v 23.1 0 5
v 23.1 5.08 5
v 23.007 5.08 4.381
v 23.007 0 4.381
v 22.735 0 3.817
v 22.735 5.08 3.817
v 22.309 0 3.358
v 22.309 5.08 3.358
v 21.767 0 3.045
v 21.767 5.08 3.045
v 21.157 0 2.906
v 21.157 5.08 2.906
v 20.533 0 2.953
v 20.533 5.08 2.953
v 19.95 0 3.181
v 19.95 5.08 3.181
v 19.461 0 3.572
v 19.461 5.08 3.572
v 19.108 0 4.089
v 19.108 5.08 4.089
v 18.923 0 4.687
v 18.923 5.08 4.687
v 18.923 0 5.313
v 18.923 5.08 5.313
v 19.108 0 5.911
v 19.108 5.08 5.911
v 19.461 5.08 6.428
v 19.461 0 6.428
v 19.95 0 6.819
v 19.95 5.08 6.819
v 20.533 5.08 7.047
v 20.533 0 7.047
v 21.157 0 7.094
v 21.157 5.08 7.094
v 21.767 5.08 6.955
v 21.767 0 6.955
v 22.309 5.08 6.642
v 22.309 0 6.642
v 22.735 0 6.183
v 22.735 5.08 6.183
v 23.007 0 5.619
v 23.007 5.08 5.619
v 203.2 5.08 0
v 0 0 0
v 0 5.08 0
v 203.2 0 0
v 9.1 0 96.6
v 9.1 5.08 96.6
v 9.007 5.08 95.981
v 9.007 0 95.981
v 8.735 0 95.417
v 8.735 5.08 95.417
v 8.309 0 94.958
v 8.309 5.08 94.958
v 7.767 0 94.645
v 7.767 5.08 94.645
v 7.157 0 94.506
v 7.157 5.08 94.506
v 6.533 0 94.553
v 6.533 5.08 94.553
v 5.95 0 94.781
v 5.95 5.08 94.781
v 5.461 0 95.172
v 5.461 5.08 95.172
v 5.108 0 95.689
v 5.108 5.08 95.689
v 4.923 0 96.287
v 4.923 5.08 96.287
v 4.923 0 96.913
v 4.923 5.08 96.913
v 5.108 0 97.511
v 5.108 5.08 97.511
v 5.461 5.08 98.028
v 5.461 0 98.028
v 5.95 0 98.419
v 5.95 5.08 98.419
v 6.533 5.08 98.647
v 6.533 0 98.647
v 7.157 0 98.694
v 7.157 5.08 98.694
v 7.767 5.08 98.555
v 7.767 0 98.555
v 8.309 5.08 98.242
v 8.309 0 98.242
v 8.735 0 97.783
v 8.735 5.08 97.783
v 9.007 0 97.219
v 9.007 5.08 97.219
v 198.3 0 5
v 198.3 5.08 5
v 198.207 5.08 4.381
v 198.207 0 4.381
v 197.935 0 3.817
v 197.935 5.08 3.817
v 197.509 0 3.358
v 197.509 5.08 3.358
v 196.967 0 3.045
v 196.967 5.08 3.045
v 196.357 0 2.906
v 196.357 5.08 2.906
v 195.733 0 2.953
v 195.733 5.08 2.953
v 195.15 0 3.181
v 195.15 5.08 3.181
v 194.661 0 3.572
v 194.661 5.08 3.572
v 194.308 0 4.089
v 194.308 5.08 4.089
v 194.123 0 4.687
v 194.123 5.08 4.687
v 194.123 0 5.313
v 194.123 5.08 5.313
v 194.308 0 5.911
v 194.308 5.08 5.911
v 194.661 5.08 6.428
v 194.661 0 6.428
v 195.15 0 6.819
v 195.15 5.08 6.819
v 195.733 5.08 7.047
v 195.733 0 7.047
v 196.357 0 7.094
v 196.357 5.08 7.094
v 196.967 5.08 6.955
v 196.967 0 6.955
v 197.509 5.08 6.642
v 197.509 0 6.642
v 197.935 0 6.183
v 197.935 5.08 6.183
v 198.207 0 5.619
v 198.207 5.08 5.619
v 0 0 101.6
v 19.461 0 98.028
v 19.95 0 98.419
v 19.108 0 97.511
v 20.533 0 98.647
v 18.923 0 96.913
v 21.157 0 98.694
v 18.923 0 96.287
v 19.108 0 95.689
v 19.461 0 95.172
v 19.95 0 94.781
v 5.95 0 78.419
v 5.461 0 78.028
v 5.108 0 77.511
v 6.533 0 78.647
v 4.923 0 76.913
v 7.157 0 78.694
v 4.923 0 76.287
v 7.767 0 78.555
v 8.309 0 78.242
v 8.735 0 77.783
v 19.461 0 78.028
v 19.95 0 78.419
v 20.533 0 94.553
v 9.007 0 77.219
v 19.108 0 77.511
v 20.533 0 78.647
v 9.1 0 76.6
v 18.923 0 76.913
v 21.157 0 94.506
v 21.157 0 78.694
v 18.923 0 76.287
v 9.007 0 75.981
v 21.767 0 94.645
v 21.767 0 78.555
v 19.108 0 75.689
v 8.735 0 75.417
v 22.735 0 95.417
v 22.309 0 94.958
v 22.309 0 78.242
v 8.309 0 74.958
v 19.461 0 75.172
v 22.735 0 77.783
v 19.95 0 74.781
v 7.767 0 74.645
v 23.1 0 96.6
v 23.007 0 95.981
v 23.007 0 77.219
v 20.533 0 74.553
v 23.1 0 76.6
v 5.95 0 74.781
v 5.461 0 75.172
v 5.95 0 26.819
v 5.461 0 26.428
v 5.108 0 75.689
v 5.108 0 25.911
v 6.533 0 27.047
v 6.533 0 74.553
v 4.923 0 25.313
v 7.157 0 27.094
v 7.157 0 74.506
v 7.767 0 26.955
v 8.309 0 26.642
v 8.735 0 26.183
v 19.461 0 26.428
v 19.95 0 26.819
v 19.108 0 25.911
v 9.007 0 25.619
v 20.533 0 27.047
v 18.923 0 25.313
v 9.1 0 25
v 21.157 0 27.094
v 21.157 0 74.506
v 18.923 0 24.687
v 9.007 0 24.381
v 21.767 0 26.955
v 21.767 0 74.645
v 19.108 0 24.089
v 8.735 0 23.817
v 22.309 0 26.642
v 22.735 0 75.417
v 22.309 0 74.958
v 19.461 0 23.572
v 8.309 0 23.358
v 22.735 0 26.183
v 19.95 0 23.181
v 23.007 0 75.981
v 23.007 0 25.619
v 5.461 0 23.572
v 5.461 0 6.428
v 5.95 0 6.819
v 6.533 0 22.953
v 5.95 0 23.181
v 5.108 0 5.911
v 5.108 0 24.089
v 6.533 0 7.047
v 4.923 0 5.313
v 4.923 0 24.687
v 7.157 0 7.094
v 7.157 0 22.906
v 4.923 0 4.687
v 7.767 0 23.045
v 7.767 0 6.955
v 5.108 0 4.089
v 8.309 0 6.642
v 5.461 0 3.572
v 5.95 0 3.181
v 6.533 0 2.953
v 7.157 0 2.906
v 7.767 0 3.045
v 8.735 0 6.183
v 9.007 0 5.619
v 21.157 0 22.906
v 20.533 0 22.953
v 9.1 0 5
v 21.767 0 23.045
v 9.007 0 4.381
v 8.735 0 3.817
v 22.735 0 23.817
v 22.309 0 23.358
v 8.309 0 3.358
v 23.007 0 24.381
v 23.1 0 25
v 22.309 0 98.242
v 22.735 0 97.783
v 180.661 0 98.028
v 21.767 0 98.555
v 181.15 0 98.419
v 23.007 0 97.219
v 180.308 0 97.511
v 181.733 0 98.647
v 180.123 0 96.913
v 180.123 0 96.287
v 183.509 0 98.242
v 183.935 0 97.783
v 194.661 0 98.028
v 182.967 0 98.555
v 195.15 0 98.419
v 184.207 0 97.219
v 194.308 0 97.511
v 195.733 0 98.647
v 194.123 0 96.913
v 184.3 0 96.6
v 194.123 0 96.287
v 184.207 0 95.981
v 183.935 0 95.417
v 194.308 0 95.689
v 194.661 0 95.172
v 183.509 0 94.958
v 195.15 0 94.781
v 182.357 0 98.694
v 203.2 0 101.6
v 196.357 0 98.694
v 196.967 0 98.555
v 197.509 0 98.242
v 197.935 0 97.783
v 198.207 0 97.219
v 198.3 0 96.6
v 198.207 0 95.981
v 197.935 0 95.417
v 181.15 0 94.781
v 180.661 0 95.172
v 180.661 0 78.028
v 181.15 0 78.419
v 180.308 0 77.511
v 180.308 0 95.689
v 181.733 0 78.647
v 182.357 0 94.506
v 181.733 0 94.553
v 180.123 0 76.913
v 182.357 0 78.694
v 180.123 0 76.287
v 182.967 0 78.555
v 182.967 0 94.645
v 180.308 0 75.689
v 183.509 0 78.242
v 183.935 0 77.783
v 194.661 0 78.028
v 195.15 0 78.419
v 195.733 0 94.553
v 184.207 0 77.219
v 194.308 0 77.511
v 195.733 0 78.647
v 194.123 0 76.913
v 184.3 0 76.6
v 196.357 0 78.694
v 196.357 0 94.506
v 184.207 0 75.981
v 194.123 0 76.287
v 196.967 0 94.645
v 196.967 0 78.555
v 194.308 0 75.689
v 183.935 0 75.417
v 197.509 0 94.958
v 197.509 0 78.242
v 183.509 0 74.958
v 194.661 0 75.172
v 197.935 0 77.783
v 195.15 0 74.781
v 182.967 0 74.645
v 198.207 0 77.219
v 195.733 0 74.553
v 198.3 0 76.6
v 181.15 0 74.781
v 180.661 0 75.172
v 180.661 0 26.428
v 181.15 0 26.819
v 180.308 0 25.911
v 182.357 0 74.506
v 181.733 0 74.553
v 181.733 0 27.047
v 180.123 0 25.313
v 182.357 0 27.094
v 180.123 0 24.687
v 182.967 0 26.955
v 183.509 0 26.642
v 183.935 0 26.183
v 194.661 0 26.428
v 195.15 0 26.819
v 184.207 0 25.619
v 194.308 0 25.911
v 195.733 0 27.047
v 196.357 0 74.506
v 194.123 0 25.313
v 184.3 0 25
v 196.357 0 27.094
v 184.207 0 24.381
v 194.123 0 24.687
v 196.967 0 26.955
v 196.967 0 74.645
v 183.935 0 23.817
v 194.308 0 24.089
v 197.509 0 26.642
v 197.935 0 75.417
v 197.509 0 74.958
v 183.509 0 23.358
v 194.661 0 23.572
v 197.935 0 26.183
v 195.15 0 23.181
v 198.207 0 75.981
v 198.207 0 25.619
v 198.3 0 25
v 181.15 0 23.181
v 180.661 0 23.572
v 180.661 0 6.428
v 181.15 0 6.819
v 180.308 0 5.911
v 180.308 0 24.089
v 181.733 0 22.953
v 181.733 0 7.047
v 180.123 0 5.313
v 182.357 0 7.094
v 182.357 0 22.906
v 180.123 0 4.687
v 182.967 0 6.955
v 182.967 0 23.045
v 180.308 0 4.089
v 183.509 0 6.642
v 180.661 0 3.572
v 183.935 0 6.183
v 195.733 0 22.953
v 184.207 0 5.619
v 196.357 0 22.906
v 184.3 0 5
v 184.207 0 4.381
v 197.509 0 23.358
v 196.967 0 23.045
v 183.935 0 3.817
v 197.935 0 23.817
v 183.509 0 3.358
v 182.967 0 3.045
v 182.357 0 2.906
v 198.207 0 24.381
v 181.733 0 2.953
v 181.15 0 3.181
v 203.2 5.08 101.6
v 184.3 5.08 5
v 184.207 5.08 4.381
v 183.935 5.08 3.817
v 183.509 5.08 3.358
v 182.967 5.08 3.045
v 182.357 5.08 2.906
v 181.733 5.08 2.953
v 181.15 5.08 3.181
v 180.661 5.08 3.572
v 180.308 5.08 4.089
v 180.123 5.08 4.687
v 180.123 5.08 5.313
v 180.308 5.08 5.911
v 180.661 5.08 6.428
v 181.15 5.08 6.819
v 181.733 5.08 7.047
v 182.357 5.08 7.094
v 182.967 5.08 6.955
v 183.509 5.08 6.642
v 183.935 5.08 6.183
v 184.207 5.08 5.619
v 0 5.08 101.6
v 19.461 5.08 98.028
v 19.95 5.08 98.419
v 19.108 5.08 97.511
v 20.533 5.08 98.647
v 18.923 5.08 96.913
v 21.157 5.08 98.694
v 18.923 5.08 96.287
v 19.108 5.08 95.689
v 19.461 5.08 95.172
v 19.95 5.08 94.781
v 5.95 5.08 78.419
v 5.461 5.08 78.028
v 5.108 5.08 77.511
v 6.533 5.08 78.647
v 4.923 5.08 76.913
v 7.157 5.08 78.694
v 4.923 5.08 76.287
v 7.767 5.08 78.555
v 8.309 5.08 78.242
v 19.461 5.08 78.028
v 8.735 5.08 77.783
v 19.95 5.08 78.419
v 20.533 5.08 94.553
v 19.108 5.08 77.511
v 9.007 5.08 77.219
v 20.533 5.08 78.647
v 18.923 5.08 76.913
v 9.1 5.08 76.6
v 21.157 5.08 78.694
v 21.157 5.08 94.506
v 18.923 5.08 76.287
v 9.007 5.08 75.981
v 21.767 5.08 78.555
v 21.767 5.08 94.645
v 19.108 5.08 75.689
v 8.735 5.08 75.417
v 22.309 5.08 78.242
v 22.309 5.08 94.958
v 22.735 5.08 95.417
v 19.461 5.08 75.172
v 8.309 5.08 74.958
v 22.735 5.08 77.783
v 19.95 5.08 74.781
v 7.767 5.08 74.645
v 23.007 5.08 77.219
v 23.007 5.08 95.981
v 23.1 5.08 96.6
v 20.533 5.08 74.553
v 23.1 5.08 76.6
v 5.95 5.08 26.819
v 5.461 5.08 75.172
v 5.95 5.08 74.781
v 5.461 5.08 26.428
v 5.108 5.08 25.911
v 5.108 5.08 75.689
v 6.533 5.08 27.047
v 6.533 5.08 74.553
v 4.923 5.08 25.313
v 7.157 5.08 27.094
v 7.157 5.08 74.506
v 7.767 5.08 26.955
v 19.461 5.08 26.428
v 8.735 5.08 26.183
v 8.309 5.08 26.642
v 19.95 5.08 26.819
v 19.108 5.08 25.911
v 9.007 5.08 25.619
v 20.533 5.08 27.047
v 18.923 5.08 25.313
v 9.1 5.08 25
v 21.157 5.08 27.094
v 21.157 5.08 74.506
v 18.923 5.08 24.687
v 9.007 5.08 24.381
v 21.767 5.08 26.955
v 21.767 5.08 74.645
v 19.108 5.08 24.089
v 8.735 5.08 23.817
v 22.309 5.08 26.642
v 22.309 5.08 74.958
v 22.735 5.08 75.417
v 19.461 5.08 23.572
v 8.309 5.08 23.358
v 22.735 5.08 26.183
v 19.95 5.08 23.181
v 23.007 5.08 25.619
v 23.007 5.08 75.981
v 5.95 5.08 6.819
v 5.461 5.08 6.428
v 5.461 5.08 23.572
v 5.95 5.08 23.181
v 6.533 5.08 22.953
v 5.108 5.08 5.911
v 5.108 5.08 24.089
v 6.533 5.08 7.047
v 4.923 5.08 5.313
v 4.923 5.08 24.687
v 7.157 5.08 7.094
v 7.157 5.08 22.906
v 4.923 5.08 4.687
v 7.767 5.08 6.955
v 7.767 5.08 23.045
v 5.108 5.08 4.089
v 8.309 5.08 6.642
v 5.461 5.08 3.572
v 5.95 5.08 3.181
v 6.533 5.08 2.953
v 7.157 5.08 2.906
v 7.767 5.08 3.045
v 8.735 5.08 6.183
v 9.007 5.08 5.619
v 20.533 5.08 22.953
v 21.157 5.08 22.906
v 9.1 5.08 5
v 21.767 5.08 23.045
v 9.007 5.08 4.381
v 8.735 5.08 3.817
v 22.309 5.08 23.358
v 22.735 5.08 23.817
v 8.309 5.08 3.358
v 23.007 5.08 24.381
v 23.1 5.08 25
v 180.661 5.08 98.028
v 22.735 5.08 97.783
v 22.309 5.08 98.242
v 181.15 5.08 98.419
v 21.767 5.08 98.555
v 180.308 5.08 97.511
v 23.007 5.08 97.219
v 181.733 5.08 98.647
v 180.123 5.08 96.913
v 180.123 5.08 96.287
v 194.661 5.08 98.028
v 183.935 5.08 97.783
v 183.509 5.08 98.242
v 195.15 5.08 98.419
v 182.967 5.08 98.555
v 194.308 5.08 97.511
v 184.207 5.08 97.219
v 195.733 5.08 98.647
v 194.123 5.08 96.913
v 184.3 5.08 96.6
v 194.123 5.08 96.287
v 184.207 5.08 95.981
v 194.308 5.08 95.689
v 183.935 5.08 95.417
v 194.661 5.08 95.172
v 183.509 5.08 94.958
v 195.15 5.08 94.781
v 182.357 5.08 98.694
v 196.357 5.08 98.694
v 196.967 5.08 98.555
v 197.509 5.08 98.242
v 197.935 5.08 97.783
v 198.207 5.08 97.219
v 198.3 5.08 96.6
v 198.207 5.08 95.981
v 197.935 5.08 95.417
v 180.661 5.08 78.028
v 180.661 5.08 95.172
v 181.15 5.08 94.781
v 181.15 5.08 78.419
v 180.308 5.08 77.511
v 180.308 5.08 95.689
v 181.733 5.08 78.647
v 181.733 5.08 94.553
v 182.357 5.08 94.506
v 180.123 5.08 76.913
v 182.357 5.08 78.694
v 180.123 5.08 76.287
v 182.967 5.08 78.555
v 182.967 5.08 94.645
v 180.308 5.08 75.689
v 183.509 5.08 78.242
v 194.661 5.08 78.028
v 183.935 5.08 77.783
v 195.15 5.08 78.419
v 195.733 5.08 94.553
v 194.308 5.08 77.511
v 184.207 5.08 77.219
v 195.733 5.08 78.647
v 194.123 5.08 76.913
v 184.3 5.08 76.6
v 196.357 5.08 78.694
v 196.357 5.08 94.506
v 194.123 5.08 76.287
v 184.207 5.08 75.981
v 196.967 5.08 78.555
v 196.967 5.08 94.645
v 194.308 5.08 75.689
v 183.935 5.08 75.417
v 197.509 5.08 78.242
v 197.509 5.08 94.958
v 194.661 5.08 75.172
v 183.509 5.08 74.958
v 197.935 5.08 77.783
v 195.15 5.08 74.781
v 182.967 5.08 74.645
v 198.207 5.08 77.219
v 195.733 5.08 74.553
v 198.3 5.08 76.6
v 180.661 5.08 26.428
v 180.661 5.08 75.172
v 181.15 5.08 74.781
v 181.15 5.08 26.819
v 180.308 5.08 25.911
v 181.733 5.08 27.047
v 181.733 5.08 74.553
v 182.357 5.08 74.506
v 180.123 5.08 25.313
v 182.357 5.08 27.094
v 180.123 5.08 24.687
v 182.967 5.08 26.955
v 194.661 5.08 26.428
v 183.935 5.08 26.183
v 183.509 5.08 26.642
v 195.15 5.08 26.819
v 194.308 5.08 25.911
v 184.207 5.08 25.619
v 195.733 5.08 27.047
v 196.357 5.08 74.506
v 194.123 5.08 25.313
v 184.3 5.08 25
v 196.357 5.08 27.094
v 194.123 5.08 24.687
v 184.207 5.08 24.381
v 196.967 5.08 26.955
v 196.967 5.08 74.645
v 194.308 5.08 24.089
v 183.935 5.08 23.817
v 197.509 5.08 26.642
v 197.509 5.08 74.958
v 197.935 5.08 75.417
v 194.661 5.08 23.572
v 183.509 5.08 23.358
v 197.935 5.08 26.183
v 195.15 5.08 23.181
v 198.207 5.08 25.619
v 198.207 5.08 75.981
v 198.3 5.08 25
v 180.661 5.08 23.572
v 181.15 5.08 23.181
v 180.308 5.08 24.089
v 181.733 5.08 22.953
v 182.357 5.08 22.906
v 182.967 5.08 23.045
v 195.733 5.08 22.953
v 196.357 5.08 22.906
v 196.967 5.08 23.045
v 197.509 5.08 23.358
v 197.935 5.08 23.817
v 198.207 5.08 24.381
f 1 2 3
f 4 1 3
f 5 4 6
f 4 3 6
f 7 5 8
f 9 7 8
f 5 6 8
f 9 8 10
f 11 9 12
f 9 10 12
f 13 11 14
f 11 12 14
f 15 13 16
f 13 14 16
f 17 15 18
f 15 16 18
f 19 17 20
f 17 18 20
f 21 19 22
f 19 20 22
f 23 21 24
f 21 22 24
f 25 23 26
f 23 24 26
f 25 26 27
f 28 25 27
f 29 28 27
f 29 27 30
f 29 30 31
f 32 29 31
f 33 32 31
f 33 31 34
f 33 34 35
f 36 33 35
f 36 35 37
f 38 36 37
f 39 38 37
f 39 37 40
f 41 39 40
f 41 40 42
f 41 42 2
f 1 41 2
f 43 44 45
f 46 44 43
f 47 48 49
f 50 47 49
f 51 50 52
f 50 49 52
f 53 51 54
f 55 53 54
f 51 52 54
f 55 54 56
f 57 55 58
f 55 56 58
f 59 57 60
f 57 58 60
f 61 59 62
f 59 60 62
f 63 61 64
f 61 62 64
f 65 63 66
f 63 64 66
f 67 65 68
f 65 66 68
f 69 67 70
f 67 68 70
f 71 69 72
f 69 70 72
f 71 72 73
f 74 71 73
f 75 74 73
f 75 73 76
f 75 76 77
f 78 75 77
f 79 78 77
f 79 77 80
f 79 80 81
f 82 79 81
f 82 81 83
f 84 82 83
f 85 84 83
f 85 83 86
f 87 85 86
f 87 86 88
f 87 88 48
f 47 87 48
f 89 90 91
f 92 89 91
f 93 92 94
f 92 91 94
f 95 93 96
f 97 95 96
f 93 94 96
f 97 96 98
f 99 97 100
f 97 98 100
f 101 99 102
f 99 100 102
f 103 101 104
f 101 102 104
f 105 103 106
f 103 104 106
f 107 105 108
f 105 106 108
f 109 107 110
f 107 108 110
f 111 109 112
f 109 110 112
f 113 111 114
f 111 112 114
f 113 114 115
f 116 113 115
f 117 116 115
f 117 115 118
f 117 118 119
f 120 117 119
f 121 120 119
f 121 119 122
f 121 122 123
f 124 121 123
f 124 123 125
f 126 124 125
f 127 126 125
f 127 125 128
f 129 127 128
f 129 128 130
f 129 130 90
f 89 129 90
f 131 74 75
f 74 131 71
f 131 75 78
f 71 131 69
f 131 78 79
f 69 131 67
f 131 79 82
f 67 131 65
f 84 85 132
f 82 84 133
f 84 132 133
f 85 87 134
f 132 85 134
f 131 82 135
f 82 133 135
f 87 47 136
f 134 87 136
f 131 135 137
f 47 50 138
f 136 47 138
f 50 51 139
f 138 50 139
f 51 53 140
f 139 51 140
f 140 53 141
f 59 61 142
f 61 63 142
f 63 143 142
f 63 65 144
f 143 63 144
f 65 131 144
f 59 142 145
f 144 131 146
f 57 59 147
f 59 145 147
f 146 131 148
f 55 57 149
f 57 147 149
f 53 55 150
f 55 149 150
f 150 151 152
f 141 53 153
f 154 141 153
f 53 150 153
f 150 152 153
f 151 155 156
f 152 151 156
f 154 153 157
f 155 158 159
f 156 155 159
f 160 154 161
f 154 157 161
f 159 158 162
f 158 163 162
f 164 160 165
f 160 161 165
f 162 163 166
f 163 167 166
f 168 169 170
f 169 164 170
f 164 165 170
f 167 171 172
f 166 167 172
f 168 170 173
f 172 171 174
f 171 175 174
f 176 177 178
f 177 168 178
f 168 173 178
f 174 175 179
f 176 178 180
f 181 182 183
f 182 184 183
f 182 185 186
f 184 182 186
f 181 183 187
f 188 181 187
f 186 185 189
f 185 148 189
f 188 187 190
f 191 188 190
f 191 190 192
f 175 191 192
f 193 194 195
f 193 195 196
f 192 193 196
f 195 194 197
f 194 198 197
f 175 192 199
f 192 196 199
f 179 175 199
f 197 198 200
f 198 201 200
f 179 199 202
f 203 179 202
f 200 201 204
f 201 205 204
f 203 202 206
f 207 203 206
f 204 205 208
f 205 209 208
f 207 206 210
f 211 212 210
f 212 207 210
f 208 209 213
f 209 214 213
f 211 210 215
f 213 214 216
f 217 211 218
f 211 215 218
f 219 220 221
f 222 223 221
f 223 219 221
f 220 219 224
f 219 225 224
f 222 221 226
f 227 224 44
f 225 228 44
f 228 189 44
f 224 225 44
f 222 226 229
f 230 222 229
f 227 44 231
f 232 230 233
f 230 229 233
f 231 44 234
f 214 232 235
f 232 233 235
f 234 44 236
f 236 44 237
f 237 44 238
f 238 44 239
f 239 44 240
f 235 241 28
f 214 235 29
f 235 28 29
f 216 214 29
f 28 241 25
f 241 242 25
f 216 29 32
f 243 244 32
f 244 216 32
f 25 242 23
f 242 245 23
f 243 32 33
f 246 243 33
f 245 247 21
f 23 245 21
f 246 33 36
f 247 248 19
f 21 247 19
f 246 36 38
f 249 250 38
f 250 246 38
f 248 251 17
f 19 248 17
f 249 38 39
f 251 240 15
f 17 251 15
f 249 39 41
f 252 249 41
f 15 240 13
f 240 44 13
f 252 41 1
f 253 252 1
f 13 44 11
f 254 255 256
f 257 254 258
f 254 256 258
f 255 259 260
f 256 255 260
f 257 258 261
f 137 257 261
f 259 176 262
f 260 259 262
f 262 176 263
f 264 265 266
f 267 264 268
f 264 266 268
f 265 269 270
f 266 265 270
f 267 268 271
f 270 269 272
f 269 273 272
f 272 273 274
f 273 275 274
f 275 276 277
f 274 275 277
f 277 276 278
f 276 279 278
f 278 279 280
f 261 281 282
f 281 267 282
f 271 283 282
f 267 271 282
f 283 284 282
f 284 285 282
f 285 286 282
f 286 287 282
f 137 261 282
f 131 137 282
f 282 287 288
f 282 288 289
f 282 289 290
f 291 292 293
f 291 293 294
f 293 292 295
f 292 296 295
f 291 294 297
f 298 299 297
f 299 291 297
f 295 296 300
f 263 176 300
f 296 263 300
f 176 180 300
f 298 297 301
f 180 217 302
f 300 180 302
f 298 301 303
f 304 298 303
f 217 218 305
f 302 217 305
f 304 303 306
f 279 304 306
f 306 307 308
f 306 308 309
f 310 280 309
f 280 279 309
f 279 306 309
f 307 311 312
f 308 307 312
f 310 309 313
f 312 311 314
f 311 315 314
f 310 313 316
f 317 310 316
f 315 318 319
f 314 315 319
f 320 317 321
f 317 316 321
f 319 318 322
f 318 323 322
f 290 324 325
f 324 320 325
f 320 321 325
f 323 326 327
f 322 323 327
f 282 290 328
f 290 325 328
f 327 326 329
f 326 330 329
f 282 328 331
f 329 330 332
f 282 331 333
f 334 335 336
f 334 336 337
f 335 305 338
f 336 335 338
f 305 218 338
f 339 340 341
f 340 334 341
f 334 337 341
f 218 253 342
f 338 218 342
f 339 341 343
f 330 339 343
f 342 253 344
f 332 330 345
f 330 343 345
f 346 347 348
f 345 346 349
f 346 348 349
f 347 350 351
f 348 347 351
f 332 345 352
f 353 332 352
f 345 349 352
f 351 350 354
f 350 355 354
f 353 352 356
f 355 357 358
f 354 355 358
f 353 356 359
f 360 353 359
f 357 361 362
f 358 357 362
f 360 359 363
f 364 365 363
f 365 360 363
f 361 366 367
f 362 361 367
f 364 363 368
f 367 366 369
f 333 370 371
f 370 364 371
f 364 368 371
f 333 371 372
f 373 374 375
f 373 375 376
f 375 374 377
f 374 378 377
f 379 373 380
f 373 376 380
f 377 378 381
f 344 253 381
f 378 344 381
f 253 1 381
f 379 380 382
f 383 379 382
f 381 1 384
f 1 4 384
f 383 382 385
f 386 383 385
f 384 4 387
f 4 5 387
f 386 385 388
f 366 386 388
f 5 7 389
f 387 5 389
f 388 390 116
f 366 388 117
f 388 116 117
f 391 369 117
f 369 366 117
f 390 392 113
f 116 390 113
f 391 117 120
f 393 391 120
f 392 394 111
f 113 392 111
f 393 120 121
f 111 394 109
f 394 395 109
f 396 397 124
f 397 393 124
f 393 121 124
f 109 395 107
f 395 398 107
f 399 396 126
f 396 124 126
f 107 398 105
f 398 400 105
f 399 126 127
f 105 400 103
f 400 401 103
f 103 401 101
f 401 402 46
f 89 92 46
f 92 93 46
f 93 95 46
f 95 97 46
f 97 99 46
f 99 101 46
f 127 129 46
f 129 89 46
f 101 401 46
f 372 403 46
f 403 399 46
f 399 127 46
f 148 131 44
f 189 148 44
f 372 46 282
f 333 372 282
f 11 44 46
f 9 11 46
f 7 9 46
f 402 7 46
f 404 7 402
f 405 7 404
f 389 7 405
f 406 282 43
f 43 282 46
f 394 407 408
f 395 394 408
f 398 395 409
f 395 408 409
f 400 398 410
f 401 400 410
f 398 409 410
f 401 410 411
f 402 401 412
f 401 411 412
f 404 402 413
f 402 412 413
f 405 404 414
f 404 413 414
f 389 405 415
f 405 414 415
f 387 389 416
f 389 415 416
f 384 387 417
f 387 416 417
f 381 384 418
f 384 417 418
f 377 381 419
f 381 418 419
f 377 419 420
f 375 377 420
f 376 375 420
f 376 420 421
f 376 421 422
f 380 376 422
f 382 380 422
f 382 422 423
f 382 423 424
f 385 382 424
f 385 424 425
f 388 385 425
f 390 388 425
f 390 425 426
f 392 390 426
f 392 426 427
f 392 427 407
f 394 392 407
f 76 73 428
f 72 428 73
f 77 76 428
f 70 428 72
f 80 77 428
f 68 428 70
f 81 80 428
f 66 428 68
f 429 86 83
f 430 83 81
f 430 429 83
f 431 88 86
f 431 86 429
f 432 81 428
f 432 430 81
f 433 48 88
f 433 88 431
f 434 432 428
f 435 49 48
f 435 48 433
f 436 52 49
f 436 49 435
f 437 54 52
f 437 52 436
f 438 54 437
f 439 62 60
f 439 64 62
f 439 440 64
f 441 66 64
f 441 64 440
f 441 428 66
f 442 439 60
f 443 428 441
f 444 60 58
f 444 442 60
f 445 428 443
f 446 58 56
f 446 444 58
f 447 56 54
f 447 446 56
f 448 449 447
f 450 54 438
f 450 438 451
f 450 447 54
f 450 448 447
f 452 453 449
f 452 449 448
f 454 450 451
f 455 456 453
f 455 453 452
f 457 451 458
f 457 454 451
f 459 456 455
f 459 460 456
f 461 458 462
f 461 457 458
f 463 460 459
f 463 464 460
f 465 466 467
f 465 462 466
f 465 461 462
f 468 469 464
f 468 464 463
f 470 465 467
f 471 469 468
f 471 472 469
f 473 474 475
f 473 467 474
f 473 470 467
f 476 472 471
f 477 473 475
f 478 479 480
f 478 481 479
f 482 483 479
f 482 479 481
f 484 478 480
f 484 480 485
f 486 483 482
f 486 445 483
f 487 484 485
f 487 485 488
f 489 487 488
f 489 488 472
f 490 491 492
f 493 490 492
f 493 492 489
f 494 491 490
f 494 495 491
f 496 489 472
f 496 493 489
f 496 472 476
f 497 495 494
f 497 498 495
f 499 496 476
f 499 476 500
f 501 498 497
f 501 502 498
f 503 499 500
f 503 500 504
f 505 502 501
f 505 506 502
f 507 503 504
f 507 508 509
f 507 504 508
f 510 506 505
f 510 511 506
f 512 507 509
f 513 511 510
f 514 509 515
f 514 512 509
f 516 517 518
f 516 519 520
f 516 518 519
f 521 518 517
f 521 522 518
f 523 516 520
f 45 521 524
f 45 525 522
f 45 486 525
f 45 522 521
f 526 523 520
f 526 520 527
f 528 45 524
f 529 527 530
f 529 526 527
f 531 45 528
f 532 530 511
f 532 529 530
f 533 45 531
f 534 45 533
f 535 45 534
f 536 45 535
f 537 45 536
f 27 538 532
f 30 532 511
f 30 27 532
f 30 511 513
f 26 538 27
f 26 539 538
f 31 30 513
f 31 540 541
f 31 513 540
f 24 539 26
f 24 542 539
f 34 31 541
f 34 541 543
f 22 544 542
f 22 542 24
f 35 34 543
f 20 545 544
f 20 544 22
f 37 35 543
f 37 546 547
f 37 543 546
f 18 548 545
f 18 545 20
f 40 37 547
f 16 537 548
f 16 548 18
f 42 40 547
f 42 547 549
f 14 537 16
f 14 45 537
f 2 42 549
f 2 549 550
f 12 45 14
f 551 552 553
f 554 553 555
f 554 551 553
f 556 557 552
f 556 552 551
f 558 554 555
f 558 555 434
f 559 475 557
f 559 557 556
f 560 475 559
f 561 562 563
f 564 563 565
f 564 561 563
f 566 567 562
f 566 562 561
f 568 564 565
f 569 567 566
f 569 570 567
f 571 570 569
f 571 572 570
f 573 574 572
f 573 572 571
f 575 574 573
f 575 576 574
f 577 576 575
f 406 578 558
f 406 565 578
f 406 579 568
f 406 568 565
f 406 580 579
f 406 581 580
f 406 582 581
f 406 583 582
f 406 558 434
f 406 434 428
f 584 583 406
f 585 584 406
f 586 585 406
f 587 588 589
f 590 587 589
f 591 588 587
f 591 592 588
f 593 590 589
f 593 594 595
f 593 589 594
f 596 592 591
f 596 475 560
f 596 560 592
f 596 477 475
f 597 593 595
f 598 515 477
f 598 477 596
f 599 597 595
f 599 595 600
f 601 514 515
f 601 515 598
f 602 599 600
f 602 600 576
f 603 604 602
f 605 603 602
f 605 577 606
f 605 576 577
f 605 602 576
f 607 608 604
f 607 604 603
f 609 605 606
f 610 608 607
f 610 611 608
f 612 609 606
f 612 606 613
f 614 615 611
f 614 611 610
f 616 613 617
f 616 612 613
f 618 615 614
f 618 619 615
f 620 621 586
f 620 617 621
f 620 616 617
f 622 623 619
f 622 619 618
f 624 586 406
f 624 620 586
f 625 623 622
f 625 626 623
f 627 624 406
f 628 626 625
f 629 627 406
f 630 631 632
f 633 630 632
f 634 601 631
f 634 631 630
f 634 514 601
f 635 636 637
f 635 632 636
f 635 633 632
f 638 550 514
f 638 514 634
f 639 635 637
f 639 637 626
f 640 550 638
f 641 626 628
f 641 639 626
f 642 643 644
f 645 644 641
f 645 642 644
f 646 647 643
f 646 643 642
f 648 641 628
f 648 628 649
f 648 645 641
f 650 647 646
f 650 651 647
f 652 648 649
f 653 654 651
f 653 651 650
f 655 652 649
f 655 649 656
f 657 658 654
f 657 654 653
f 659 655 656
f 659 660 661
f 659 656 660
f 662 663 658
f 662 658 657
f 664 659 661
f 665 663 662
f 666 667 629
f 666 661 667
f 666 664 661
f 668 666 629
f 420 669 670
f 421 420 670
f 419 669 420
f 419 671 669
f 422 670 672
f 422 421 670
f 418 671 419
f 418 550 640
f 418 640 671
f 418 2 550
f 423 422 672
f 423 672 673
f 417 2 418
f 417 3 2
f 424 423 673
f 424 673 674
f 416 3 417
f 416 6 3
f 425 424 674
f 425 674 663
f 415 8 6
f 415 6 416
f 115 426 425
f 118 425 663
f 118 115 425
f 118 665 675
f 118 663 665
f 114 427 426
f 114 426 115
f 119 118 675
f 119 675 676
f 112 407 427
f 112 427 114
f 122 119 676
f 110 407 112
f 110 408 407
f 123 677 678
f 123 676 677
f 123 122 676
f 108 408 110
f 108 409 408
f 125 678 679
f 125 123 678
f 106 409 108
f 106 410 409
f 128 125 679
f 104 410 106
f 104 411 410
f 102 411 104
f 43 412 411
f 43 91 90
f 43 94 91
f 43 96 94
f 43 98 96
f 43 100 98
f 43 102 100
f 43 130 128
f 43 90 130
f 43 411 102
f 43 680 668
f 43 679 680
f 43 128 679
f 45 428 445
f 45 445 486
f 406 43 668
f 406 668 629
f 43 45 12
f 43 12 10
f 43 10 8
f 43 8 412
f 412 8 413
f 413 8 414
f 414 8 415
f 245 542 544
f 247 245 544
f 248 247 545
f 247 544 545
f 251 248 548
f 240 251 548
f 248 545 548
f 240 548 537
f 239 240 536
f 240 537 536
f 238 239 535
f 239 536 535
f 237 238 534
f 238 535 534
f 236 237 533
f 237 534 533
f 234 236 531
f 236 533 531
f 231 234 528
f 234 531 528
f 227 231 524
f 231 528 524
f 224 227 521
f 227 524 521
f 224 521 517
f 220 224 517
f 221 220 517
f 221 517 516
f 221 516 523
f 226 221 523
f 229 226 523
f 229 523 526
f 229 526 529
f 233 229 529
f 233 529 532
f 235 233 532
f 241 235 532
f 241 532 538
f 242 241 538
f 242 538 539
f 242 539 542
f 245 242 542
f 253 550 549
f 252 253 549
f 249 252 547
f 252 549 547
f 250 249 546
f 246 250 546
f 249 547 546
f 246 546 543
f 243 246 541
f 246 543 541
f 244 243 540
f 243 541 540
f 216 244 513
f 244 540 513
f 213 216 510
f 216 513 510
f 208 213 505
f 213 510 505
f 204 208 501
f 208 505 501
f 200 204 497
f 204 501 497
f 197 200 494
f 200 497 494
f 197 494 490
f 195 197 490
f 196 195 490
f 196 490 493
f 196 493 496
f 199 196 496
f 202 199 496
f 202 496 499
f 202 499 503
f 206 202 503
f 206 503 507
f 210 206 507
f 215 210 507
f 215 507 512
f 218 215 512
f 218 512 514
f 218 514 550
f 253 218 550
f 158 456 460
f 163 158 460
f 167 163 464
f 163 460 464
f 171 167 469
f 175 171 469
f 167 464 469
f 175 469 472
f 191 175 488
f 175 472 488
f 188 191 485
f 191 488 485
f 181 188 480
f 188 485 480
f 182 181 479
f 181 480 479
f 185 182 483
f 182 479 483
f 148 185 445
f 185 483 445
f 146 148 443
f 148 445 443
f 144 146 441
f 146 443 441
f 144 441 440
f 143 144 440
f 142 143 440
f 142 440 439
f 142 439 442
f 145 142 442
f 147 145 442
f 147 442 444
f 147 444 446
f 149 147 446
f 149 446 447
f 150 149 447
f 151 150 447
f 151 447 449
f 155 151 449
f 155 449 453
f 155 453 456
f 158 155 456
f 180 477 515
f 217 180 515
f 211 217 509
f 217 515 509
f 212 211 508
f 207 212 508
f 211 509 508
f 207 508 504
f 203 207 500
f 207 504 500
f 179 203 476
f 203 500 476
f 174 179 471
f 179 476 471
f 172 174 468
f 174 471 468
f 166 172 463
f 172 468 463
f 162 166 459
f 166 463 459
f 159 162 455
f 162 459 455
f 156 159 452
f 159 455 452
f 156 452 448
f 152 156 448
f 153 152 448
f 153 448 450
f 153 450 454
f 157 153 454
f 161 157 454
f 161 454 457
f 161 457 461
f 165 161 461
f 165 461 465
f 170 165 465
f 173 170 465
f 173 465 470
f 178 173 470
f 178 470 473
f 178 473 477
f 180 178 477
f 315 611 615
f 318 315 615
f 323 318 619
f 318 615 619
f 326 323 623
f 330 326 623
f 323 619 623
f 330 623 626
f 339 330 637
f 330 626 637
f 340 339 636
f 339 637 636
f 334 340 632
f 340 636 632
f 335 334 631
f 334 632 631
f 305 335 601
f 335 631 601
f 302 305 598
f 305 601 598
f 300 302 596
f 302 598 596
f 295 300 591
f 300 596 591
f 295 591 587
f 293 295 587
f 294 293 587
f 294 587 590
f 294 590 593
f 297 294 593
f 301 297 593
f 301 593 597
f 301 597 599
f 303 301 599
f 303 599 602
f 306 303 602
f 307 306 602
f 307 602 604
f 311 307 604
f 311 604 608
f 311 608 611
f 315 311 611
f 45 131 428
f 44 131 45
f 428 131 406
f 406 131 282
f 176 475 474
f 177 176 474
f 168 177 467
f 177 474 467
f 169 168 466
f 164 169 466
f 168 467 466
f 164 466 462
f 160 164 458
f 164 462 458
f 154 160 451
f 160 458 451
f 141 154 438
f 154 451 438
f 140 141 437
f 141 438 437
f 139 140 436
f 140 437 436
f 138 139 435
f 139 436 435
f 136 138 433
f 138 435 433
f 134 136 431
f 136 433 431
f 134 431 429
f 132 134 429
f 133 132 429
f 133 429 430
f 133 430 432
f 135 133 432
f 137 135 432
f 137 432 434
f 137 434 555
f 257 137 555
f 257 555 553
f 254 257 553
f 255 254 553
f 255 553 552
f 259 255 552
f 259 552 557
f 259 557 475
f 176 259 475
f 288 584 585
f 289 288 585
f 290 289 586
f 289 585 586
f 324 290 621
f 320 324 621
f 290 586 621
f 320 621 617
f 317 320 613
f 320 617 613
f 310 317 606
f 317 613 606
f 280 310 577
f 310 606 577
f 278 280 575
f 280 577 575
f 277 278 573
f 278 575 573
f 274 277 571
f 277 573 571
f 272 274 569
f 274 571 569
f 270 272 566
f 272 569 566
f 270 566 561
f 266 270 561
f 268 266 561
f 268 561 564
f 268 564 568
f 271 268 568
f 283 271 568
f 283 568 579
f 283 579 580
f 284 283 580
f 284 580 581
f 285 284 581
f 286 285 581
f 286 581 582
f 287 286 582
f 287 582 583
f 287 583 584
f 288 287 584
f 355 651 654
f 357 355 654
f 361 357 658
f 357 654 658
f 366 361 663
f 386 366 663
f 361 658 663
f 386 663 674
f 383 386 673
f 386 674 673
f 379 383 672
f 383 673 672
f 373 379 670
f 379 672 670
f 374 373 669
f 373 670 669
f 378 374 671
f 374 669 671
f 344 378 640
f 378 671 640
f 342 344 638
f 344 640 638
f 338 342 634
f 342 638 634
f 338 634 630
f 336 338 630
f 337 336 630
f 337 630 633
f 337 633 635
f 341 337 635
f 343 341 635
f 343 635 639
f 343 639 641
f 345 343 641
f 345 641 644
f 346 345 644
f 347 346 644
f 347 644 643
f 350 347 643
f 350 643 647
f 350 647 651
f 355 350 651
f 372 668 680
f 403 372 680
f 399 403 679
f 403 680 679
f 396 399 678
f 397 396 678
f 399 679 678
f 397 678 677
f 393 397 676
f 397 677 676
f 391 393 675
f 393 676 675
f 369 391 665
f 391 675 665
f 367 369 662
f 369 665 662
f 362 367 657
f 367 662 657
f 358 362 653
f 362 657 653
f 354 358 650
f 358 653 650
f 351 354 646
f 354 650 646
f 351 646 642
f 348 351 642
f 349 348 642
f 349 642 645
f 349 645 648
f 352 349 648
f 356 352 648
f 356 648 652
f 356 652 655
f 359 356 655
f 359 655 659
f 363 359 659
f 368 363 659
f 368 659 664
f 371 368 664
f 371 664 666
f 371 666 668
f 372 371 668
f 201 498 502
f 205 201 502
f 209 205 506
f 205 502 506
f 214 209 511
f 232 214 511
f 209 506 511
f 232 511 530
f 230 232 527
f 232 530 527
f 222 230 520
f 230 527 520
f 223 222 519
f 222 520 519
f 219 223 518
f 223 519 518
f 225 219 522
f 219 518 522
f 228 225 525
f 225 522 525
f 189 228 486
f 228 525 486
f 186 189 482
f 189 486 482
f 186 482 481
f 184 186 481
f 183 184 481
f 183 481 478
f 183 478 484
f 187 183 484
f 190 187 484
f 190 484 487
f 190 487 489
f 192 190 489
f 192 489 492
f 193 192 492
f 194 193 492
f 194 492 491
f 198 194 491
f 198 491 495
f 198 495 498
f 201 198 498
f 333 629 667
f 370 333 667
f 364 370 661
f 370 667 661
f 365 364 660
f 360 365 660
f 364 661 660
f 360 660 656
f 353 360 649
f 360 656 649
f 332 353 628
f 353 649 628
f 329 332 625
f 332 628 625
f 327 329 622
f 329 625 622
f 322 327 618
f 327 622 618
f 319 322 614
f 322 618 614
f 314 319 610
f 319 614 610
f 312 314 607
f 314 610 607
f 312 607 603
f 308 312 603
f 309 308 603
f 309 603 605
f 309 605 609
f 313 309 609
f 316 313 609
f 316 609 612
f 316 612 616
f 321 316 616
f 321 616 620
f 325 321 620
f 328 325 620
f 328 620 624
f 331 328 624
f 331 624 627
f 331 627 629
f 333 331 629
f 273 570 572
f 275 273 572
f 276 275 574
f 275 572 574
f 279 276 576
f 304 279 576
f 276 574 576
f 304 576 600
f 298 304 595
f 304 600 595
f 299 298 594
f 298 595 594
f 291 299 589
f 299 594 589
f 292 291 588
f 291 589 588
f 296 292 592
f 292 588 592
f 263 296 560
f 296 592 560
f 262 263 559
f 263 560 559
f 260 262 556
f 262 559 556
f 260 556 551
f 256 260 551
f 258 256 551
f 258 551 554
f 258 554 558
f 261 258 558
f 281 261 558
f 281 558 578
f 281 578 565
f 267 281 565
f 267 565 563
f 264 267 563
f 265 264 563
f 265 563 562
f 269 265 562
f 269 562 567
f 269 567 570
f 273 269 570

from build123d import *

# Parameters (mm, degrees)
SKETCH1_W                   = 203.2
SKETCH1_H                   = 101.6
BOSS_EXTRUDE1_DEPTH         = 5.08
TAP_DRILL_FOR_M5X0_8_TAP1_D = 4.2


with BuildPart() as part:
    # Sketch1 → Boss-Extrude1 (new body)
    with BuildSketch(Plane(origin=(0, 0, 0), x_dir=(1, 0, 0), z_dir=(0, 1, 0))):
        with Locations((101.6, -50.8)):
            Rectangle(SKETCH1_W, SKETCH1_H)
    extrude(amount=BOSS_EXTRUDE1_DEPTH)

    # Tap Drill for M5x0.8 Tap1 (through all)
    with Locations(Plane(origin=(0, 0, 0), x_dir=(-1, 0, 0), z_dir=(0, -1, 0))):
        with Locations((-196.2, -5), (-182.2, -5), (-196.2, -25), (-182.2, -25), (-21, -5), (-7, -5), (-21, -25), (-7, -25), (-7, -76.6), (-196.2, -76.6), (-182.2, -76.6), (-182.2, -96.6), (-196.2, -96.6), (-21, -76.6), (-21, -96.6), (-7, -96.6)):
            Hole(TAP_DRILL_FOR_M5X0_8_TAP1_D / 2)


solid = part.part
